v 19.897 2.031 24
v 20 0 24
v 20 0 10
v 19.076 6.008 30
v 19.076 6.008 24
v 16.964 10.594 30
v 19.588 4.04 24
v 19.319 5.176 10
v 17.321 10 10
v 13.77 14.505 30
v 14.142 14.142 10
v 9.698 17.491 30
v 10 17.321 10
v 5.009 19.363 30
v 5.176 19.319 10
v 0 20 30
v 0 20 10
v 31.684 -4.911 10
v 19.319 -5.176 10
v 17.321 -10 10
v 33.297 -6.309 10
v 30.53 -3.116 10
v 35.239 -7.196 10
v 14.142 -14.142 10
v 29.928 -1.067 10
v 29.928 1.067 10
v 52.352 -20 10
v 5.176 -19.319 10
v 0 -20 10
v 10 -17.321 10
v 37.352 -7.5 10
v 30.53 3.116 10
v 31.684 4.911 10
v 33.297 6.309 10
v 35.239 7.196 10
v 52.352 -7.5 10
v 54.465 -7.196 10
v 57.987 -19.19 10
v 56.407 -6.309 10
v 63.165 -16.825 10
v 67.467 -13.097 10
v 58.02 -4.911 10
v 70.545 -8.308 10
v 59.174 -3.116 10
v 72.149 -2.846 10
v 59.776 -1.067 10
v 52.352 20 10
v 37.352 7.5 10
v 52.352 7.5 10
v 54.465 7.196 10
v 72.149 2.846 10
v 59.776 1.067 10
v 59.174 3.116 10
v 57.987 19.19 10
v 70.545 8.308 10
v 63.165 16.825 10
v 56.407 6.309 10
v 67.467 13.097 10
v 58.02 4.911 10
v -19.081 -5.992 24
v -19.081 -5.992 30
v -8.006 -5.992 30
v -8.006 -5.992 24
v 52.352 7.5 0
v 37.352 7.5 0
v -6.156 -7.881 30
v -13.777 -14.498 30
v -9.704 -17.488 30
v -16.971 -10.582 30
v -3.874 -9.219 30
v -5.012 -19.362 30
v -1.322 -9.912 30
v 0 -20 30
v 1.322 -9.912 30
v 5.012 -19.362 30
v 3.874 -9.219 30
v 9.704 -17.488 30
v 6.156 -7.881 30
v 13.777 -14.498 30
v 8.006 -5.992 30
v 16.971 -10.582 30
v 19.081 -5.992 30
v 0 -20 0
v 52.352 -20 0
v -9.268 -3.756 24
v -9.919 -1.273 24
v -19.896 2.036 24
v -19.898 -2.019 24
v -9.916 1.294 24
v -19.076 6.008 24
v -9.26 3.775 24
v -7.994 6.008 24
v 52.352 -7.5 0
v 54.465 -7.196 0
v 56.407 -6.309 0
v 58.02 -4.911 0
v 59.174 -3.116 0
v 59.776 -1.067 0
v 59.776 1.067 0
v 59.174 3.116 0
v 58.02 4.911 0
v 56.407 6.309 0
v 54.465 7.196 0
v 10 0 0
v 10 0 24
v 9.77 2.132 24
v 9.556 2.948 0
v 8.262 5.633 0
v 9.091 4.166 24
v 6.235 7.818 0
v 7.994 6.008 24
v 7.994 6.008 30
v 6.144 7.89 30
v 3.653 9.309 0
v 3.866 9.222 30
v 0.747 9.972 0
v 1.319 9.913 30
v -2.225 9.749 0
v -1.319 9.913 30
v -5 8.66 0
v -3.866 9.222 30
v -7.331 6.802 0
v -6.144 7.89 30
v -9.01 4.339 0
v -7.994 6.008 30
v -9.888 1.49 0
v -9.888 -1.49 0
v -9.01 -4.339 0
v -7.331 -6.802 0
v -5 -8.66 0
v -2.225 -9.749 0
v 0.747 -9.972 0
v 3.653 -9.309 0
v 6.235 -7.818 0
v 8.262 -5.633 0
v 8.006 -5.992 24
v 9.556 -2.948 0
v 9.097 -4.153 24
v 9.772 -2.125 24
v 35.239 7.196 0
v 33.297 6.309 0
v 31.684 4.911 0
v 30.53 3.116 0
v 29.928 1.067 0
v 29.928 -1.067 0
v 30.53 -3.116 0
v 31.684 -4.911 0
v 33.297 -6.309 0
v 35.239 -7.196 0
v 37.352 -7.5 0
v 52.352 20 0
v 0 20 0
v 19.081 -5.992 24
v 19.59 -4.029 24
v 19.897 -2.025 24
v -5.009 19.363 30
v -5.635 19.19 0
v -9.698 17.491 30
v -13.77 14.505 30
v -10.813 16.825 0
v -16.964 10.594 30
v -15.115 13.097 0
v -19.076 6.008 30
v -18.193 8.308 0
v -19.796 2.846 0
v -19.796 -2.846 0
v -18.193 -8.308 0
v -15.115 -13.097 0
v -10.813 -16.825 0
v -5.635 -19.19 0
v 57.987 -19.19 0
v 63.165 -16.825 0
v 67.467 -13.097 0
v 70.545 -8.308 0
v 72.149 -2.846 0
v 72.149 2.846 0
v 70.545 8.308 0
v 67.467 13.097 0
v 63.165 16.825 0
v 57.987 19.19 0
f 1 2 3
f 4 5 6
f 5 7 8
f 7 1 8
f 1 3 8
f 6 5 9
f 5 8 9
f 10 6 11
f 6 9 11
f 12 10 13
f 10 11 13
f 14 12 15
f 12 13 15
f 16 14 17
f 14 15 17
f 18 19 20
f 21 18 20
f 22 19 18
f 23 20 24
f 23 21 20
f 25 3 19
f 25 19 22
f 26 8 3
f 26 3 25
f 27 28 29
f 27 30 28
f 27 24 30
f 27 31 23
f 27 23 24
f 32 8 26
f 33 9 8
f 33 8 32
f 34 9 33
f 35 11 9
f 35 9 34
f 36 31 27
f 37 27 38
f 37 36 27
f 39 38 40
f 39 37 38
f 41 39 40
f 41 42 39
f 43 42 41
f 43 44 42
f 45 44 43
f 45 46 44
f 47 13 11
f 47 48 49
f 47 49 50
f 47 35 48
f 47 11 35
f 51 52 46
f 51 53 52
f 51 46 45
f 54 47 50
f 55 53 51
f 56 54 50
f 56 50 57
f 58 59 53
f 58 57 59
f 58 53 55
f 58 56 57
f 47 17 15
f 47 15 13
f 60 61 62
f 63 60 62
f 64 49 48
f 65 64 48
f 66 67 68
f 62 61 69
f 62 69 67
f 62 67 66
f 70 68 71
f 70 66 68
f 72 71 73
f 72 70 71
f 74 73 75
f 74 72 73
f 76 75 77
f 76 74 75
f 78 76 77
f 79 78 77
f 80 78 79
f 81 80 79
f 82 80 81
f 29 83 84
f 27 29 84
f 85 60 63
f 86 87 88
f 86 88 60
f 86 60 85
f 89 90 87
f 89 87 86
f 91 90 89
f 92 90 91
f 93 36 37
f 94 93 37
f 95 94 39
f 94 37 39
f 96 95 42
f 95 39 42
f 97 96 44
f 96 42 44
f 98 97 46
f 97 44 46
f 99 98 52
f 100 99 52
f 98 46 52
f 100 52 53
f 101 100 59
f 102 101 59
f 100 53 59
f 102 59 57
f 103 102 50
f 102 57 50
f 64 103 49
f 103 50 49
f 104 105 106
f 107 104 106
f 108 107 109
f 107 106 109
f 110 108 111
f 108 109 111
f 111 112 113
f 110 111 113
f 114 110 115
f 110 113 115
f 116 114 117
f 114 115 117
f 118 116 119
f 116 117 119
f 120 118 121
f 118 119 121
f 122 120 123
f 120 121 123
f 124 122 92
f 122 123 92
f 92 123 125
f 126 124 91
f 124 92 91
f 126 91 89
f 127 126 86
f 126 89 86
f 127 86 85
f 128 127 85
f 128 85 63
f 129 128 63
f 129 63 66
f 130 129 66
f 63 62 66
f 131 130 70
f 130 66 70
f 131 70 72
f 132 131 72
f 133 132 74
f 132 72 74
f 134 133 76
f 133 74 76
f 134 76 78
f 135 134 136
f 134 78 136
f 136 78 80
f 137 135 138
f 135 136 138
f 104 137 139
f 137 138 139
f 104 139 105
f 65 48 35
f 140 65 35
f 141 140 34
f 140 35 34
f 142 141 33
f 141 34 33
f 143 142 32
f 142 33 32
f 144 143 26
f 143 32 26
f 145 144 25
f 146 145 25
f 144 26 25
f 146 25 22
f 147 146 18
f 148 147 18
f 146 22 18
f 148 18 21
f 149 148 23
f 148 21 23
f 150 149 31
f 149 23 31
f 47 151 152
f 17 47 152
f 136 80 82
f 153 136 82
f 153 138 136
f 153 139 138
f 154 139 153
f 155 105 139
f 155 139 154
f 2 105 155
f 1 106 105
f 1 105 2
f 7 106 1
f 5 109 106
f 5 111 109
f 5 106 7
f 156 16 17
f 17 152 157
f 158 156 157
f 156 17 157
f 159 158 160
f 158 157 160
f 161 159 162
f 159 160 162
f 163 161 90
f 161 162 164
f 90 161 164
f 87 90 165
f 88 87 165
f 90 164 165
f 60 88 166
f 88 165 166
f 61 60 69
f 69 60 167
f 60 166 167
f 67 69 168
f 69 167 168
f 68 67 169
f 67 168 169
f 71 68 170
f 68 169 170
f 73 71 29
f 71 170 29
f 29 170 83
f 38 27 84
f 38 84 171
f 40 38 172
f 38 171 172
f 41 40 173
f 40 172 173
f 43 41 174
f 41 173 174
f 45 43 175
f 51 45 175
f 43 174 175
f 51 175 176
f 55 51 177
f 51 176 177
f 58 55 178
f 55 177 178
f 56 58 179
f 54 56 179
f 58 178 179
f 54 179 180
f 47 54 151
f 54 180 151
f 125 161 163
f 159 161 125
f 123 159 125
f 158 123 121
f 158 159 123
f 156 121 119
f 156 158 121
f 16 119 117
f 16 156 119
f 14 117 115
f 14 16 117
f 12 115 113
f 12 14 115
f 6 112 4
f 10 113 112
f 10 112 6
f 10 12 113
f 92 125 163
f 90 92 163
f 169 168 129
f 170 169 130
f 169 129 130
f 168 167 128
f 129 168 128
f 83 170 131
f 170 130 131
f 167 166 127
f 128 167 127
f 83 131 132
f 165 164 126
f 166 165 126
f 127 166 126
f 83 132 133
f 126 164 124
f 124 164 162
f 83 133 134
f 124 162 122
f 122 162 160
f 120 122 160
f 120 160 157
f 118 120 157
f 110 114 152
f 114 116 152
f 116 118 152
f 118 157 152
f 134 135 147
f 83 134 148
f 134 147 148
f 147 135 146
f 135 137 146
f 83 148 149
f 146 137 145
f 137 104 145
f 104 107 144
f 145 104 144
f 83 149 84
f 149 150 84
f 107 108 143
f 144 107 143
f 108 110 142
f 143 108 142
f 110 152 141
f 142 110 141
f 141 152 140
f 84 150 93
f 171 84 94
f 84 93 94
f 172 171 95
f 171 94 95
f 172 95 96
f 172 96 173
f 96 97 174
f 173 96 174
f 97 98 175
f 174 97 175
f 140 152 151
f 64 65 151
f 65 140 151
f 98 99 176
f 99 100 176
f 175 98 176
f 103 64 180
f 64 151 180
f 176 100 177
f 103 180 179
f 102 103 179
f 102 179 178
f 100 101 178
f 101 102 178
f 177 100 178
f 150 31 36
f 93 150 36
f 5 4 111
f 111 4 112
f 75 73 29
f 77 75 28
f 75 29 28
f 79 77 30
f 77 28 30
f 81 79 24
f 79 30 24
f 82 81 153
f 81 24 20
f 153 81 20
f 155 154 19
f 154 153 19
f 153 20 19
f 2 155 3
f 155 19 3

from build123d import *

# Parameters (mm, degrees)
F1_DEPTH = 10
F3_DEPTH = 20
F4_R     = 10
F5_DEPTH = 50
F7_DEPTH = 6
F9_DEPTH = 25


with BuildPart() as f1:
    # F0 (on Top) → F1 (new body)
    with BuildSketch(Plane.XY):
        with BuildLine():
            Line((52.3521453142, 20), (0, 20))
            ThreePointArc((0, 20), (-20, 0), (0, -20))
            Line((0, -20), (52.3521453142, -20))
            ThreePointArc((52.3521453142, -20), (72.3521453142, 0), (52.3521453142, 20))
        make_face()
    extrude(amount=F1_DEPTH)

    # F2 (on face) → F3 (join)
    with BuildSketch(Plane.XY.offset(10)):
        with BuildLine():
            ThreePointArc((0, -20), (14.1421356237, -14.1421356237), (20, 0))
            ThreePointArc((20, 0), (14.1421356237, 14.1421356237), (0, 20))
            ThreePointArc((0, 20), (-20, 0), (0, -20))
        make_face()
    extrude(amount=F3_DEPTH)

    # F4 (on face) → F5 (cut)
    with BuildSketch(Plane.XY.offset(30)):
        Circle(F4_R)
    extrude(amount=-F5_DEPTH, mode=Mode.SUBTRACT)

    # F6 (on face) → F7 (cut)
    with BuildSketch(Plane.XY.offset(30)):
        with BuildLine():
            Line((24.870807305, 6.0082398243), (19.0761907679, 6.0082398243))
            ThreePointArc((19.0761907679, 6.0082398243), (19.7676985934, 3.0394230244), (20, 0))
            ThreePointArc((20, 0), (19.7690094284, -3.0308853852), (19.0813733782, -5.9917601757))
            Line((19.0813733782, -5.9917601757), (24.870807305, -5.9917601757))
            Line((24.870807305, -5.9917601757), (24.870807305, 6.0082398243))
        make_face()
        with BuildLine():
            Line((-7.9938134963, 6.0082398243), (-19.0761907679, 6.0082398243))
            ThreePointArc((-19.0761907679, 6.0082398243), (-19.9999981348, 0.008637683), (-19.0813733782, -5.9917601757))
            Line((-19.0813733782, -5.9917601757), (-8.006173243, -5.9917601757))
            ThreePointArc((-8.006173243, -5.9917601757), (-9.9999946957, 0.0102997835), (-7.9938134963, 6.0082398243))
        make_face()
        with BuildLine():
            Line((7.9938134963, 6.0082398243), (-7.9938134963, 6.0082398243))
            ThreePointArc((-7.9938134963, 6.0082398243), (-9.9999946957, 0.0102997835), (-8.006173243, -5.9917601757))
            Line((-8.006173243, -5.9917601757), (8.006173243, -5.9917601757))
            ThreePointArc((8.006173243, -5.9917601757), (9.4884596334, -3.1573935113), (10, 0))
            ThreePointArc((10, 0), (9.4852025535, 3.1671647445), (7.9938134963, 6.0082398243))
        make_face()
        with BuildLine():
            ThreePointArc((20, 0), (19.7676985934, 3.0394230244), (19.0761907679, 6.0082398243))
            Line((19.0761907679, 6.0082398243), (7.9938134963, 6.0082398243))
            ThreePointArc((7.9938134963, 6.0082398243), (9.4852025535, 3.1671647445), (10, 0))
            ThreePointArc((10, 0), (9.4884596334, -3.1573935113), (8.006173243, -5.9917601757))
            Line((8.006173243, -5.9917601757), (19.0813733782, -5.9917601757))
            ThreePointArc((19.0813733782, -5.9917601757), (19.7690094284, -3.0308853852), (20, 0))
        make_face()
    extrude(amount=-F7_DEPTH, mode=Mode.SUBTRACT)

    # F8 (on face) → F9 (cut)
    with BuildSketch(Plane.XY.offset(10)):
        with BuildLine():
            Line((52.3521453142, 7.5), (37.3521453142, 7.5))
            ThreePointArc((37.3521453142, 7.5), (29.8521453142, 0), (37.3521453142, -7.5))
            Line((37.3521453142, -7.5), (52.3521453142, -7.5))
            ThreePointArc((52.3521453142, -7.5), (59.8521453142, 0), (52.3521453142, 7.5))
        make_face()
    extrude(amount=-F9_DEPTH, mode=Mode.SUBTRACT)


solid = f1.part
